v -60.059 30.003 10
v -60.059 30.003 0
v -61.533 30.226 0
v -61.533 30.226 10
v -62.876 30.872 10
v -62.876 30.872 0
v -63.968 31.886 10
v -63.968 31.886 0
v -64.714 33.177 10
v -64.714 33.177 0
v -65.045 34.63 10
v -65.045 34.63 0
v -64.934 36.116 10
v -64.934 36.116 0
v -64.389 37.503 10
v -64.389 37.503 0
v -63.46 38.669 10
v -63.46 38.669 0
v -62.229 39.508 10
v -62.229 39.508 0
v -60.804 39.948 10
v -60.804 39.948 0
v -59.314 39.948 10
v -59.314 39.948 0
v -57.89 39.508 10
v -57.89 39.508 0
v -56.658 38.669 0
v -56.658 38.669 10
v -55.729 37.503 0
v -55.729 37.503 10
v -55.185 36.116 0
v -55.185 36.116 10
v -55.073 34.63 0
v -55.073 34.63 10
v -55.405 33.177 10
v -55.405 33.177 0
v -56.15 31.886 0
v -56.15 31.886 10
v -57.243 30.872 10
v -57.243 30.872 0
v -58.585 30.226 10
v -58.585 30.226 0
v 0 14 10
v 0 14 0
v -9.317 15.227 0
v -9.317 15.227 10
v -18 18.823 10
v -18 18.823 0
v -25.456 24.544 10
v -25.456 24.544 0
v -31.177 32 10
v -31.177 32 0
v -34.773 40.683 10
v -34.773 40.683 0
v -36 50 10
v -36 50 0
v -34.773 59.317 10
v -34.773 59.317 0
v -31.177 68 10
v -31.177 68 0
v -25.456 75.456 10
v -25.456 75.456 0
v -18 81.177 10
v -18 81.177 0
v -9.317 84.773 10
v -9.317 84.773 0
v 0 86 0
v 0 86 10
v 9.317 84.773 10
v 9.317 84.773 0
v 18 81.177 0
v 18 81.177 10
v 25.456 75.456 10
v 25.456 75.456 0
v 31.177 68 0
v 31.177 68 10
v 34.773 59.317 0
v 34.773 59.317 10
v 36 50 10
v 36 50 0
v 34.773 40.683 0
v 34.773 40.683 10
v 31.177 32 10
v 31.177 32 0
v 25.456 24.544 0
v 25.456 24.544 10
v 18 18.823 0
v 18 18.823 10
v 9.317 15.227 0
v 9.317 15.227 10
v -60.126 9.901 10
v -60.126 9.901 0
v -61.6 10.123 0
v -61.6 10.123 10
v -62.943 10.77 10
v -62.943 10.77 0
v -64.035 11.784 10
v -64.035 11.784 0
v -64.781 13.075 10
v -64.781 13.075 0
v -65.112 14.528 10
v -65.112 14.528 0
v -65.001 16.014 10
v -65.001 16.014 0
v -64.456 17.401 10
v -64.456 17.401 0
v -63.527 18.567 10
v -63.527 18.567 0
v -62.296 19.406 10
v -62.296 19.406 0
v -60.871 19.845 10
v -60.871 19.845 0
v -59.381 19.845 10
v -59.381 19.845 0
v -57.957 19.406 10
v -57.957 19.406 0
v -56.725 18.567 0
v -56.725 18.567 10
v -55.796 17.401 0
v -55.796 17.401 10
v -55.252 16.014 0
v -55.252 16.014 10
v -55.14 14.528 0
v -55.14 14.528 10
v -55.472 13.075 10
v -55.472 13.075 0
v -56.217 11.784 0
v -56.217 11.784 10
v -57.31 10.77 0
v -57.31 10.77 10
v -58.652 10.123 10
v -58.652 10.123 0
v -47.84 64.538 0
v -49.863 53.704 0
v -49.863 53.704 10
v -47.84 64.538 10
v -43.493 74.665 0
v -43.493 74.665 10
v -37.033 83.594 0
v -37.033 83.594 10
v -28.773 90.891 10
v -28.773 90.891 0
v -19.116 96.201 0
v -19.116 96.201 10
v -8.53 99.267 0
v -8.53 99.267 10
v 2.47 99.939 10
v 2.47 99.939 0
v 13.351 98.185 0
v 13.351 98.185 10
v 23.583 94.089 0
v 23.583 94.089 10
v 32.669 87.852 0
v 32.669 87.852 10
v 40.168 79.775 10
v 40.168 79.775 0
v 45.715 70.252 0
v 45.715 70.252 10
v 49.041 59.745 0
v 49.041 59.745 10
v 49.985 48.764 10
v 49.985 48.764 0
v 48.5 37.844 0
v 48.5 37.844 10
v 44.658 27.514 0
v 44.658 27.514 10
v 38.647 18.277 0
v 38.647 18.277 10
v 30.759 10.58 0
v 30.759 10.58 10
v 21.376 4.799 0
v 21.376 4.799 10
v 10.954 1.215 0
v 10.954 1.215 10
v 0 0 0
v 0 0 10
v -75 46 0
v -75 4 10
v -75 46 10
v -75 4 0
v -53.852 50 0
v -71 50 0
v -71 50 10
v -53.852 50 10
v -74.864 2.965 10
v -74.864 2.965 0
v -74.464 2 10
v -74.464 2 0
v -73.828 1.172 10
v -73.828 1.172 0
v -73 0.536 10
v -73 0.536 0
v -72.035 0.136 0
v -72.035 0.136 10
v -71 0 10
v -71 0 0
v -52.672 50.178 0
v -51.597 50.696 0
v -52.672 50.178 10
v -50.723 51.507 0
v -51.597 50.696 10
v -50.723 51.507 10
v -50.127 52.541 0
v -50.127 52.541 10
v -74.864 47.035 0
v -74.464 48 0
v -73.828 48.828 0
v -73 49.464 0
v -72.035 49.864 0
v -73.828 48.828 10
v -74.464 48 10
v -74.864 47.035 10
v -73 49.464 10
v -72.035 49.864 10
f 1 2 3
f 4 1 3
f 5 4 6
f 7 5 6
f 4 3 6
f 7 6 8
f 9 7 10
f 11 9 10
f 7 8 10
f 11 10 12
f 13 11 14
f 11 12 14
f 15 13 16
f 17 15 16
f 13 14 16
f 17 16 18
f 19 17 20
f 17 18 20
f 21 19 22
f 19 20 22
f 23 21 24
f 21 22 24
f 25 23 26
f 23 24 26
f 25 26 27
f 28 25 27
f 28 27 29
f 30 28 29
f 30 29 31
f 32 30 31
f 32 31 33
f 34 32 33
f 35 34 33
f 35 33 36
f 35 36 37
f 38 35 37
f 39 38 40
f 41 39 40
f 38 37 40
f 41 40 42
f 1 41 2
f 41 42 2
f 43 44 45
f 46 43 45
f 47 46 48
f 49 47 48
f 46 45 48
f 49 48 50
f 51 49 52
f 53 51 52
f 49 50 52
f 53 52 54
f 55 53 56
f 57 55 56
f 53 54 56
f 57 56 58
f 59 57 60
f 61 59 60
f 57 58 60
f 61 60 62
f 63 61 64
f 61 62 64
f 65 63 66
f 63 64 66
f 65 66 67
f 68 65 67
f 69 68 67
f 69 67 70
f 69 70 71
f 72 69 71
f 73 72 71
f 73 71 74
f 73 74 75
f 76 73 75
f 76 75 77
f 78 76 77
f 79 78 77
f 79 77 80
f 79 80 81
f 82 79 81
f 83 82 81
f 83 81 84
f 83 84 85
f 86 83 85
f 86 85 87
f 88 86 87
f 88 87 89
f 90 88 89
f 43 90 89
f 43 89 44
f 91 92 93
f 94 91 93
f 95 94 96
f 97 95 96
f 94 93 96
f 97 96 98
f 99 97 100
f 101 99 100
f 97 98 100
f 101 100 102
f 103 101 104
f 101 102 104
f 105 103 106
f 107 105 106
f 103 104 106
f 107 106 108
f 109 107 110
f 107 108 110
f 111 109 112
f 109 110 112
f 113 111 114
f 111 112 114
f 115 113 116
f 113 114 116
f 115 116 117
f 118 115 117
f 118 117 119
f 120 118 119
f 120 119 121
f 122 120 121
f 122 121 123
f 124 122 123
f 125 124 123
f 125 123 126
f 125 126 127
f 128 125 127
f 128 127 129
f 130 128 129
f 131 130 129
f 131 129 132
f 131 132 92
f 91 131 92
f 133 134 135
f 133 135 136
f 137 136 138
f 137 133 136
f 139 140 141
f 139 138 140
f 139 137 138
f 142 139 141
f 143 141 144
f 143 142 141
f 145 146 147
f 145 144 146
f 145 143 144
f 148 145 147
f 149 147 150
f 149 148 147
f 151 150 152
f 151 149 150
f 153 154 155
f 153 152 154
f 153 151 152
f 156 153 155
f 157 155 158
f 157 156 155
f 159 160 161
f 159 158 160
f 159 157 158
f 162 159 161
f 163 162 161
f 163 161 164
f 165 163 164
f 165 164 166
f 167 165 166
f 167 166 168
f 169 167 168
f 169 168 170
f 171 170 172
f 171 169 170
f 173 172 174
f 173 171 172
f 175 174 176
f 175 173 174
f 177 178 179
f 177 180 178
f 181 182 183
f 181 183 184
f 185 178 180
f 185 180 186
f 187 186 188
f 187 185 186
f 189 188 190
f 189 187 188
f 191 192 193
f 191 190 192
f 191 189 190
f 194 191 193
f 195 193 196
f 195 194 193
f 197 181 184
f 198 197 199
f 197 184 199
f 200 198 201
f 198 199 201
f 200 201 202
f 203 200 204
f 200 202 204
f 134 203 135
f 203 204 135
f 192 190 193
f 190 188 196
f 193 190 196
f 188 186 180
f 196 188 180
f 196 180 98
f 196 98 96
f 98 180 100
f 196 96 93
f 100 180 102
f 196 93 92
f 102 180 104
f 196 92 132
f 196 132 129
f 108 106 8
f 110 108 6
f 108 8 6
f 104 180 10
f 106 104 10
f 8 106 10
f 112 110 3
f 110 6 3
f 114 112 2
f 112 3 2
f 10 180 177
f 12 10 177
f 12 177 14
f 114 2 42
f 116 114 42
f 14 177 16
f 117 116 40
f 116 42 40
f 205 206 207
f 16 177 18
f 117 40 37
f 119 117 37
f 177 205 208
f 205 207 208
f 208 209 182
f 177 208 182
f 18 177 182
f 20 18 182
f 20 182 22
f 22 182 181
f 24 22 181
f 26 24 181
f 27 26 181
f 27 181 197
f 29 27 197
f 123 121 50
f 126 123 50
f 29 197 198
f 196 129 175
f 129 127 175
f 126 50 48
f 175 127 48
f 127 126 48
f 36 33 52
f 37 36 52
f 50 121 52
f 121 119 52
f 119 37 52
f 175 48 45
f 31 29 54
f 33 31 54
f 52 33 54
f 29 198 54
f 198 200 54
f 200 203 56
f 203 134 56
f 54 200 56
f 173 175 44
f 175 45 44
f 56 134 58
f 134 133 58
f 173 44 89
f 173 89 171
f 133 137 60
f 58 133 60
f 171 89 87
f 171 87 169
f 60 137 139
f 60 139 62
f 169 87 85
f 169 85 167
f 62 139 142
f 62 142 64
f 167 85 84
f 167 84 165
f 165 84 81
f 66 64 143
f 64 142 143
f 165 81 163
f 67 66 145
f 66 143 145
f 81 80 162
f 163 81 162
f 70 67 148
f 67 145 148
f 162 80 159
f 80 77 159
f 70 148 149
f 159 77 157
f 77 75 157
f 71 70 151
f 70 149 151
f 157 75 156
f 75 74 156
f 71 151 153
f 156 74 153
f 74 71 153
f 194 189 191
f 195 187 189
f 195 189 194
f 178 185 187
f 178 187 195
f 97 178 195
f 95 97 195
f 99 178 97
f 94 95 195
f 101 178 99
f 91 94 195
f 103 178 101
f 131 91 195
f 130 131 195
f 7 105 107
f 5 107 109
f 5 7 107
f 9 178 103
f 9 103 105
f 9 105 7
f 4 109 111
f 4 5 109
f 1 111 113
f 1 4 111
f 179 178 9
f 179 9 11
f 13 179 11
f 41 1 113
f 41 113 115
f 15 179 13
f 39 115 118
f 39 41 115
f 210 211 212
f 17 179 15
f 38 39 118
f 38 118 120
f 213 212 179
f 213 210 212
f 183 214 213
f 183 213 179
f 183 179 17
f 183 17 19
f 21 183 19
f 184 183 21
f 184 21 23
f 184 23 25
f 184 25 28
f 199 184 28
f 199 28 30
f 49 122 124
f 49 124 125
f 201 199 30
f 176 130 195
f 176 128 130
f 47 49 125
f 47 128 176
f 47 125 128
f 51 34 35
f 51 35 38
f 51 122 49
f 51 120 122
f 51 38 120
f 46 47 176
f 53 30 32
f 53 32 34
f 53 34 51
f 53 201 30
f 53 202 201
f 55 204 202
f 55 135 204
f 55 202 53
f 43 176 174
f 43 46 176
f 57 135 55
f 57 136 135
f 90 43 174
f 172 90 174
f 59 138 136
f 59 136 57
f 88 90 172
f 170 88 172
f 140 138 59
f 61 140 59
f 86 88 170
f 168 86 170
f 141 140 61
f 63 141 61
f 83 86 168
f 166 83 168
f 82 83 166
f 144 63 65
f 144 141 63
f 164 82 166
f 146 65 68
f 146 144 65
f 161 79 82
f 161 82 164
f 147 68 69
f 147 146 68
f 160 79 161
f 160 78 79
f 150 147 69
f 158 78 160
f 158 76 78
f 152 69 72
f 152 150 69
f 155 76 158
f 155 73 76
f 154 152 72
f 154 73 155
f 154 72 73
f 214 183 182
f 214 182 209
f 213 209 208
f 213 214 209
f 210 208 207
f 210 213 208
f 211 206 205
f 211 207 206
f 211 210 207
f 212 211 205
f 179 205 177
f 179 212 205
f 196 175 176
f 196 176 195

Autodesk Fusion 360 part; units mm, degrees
sketch "Sketch1" plane through (0, 0, 0) normal (0, 0, 1) x (1, 0, 0)
  line L0 (0, 0) -> (-75, 0)
  line L1 (-75, 0) -> (-75, 50)
  line L2 (-75, 50) -> (-50, 50)
  arc A0 (0, 0) -> (-50, 50) centre (0, 50) ccw
extrude "Extrude1" add sketch "Sketch1" along normal blind 10
fillet "Fillet1" radius 4 3 edges at (-75, 0, 5) (-75, 50, 5) (-50, 50, 5)
hole "Hole1" at (0, 50, 10) direction (0, 0, -1) diameter 72 depth 10 tip angle 118
hole "Hole2" at (-60.0592, 35.0034, 10) direction (0, 0, -1) diameter 10 depth 10 tip angle 118
hole "Hole3" at (-60.1262, 14.9013, 10) direction (0, 0, -1) diameter 10 depth 10 tip angle 118
